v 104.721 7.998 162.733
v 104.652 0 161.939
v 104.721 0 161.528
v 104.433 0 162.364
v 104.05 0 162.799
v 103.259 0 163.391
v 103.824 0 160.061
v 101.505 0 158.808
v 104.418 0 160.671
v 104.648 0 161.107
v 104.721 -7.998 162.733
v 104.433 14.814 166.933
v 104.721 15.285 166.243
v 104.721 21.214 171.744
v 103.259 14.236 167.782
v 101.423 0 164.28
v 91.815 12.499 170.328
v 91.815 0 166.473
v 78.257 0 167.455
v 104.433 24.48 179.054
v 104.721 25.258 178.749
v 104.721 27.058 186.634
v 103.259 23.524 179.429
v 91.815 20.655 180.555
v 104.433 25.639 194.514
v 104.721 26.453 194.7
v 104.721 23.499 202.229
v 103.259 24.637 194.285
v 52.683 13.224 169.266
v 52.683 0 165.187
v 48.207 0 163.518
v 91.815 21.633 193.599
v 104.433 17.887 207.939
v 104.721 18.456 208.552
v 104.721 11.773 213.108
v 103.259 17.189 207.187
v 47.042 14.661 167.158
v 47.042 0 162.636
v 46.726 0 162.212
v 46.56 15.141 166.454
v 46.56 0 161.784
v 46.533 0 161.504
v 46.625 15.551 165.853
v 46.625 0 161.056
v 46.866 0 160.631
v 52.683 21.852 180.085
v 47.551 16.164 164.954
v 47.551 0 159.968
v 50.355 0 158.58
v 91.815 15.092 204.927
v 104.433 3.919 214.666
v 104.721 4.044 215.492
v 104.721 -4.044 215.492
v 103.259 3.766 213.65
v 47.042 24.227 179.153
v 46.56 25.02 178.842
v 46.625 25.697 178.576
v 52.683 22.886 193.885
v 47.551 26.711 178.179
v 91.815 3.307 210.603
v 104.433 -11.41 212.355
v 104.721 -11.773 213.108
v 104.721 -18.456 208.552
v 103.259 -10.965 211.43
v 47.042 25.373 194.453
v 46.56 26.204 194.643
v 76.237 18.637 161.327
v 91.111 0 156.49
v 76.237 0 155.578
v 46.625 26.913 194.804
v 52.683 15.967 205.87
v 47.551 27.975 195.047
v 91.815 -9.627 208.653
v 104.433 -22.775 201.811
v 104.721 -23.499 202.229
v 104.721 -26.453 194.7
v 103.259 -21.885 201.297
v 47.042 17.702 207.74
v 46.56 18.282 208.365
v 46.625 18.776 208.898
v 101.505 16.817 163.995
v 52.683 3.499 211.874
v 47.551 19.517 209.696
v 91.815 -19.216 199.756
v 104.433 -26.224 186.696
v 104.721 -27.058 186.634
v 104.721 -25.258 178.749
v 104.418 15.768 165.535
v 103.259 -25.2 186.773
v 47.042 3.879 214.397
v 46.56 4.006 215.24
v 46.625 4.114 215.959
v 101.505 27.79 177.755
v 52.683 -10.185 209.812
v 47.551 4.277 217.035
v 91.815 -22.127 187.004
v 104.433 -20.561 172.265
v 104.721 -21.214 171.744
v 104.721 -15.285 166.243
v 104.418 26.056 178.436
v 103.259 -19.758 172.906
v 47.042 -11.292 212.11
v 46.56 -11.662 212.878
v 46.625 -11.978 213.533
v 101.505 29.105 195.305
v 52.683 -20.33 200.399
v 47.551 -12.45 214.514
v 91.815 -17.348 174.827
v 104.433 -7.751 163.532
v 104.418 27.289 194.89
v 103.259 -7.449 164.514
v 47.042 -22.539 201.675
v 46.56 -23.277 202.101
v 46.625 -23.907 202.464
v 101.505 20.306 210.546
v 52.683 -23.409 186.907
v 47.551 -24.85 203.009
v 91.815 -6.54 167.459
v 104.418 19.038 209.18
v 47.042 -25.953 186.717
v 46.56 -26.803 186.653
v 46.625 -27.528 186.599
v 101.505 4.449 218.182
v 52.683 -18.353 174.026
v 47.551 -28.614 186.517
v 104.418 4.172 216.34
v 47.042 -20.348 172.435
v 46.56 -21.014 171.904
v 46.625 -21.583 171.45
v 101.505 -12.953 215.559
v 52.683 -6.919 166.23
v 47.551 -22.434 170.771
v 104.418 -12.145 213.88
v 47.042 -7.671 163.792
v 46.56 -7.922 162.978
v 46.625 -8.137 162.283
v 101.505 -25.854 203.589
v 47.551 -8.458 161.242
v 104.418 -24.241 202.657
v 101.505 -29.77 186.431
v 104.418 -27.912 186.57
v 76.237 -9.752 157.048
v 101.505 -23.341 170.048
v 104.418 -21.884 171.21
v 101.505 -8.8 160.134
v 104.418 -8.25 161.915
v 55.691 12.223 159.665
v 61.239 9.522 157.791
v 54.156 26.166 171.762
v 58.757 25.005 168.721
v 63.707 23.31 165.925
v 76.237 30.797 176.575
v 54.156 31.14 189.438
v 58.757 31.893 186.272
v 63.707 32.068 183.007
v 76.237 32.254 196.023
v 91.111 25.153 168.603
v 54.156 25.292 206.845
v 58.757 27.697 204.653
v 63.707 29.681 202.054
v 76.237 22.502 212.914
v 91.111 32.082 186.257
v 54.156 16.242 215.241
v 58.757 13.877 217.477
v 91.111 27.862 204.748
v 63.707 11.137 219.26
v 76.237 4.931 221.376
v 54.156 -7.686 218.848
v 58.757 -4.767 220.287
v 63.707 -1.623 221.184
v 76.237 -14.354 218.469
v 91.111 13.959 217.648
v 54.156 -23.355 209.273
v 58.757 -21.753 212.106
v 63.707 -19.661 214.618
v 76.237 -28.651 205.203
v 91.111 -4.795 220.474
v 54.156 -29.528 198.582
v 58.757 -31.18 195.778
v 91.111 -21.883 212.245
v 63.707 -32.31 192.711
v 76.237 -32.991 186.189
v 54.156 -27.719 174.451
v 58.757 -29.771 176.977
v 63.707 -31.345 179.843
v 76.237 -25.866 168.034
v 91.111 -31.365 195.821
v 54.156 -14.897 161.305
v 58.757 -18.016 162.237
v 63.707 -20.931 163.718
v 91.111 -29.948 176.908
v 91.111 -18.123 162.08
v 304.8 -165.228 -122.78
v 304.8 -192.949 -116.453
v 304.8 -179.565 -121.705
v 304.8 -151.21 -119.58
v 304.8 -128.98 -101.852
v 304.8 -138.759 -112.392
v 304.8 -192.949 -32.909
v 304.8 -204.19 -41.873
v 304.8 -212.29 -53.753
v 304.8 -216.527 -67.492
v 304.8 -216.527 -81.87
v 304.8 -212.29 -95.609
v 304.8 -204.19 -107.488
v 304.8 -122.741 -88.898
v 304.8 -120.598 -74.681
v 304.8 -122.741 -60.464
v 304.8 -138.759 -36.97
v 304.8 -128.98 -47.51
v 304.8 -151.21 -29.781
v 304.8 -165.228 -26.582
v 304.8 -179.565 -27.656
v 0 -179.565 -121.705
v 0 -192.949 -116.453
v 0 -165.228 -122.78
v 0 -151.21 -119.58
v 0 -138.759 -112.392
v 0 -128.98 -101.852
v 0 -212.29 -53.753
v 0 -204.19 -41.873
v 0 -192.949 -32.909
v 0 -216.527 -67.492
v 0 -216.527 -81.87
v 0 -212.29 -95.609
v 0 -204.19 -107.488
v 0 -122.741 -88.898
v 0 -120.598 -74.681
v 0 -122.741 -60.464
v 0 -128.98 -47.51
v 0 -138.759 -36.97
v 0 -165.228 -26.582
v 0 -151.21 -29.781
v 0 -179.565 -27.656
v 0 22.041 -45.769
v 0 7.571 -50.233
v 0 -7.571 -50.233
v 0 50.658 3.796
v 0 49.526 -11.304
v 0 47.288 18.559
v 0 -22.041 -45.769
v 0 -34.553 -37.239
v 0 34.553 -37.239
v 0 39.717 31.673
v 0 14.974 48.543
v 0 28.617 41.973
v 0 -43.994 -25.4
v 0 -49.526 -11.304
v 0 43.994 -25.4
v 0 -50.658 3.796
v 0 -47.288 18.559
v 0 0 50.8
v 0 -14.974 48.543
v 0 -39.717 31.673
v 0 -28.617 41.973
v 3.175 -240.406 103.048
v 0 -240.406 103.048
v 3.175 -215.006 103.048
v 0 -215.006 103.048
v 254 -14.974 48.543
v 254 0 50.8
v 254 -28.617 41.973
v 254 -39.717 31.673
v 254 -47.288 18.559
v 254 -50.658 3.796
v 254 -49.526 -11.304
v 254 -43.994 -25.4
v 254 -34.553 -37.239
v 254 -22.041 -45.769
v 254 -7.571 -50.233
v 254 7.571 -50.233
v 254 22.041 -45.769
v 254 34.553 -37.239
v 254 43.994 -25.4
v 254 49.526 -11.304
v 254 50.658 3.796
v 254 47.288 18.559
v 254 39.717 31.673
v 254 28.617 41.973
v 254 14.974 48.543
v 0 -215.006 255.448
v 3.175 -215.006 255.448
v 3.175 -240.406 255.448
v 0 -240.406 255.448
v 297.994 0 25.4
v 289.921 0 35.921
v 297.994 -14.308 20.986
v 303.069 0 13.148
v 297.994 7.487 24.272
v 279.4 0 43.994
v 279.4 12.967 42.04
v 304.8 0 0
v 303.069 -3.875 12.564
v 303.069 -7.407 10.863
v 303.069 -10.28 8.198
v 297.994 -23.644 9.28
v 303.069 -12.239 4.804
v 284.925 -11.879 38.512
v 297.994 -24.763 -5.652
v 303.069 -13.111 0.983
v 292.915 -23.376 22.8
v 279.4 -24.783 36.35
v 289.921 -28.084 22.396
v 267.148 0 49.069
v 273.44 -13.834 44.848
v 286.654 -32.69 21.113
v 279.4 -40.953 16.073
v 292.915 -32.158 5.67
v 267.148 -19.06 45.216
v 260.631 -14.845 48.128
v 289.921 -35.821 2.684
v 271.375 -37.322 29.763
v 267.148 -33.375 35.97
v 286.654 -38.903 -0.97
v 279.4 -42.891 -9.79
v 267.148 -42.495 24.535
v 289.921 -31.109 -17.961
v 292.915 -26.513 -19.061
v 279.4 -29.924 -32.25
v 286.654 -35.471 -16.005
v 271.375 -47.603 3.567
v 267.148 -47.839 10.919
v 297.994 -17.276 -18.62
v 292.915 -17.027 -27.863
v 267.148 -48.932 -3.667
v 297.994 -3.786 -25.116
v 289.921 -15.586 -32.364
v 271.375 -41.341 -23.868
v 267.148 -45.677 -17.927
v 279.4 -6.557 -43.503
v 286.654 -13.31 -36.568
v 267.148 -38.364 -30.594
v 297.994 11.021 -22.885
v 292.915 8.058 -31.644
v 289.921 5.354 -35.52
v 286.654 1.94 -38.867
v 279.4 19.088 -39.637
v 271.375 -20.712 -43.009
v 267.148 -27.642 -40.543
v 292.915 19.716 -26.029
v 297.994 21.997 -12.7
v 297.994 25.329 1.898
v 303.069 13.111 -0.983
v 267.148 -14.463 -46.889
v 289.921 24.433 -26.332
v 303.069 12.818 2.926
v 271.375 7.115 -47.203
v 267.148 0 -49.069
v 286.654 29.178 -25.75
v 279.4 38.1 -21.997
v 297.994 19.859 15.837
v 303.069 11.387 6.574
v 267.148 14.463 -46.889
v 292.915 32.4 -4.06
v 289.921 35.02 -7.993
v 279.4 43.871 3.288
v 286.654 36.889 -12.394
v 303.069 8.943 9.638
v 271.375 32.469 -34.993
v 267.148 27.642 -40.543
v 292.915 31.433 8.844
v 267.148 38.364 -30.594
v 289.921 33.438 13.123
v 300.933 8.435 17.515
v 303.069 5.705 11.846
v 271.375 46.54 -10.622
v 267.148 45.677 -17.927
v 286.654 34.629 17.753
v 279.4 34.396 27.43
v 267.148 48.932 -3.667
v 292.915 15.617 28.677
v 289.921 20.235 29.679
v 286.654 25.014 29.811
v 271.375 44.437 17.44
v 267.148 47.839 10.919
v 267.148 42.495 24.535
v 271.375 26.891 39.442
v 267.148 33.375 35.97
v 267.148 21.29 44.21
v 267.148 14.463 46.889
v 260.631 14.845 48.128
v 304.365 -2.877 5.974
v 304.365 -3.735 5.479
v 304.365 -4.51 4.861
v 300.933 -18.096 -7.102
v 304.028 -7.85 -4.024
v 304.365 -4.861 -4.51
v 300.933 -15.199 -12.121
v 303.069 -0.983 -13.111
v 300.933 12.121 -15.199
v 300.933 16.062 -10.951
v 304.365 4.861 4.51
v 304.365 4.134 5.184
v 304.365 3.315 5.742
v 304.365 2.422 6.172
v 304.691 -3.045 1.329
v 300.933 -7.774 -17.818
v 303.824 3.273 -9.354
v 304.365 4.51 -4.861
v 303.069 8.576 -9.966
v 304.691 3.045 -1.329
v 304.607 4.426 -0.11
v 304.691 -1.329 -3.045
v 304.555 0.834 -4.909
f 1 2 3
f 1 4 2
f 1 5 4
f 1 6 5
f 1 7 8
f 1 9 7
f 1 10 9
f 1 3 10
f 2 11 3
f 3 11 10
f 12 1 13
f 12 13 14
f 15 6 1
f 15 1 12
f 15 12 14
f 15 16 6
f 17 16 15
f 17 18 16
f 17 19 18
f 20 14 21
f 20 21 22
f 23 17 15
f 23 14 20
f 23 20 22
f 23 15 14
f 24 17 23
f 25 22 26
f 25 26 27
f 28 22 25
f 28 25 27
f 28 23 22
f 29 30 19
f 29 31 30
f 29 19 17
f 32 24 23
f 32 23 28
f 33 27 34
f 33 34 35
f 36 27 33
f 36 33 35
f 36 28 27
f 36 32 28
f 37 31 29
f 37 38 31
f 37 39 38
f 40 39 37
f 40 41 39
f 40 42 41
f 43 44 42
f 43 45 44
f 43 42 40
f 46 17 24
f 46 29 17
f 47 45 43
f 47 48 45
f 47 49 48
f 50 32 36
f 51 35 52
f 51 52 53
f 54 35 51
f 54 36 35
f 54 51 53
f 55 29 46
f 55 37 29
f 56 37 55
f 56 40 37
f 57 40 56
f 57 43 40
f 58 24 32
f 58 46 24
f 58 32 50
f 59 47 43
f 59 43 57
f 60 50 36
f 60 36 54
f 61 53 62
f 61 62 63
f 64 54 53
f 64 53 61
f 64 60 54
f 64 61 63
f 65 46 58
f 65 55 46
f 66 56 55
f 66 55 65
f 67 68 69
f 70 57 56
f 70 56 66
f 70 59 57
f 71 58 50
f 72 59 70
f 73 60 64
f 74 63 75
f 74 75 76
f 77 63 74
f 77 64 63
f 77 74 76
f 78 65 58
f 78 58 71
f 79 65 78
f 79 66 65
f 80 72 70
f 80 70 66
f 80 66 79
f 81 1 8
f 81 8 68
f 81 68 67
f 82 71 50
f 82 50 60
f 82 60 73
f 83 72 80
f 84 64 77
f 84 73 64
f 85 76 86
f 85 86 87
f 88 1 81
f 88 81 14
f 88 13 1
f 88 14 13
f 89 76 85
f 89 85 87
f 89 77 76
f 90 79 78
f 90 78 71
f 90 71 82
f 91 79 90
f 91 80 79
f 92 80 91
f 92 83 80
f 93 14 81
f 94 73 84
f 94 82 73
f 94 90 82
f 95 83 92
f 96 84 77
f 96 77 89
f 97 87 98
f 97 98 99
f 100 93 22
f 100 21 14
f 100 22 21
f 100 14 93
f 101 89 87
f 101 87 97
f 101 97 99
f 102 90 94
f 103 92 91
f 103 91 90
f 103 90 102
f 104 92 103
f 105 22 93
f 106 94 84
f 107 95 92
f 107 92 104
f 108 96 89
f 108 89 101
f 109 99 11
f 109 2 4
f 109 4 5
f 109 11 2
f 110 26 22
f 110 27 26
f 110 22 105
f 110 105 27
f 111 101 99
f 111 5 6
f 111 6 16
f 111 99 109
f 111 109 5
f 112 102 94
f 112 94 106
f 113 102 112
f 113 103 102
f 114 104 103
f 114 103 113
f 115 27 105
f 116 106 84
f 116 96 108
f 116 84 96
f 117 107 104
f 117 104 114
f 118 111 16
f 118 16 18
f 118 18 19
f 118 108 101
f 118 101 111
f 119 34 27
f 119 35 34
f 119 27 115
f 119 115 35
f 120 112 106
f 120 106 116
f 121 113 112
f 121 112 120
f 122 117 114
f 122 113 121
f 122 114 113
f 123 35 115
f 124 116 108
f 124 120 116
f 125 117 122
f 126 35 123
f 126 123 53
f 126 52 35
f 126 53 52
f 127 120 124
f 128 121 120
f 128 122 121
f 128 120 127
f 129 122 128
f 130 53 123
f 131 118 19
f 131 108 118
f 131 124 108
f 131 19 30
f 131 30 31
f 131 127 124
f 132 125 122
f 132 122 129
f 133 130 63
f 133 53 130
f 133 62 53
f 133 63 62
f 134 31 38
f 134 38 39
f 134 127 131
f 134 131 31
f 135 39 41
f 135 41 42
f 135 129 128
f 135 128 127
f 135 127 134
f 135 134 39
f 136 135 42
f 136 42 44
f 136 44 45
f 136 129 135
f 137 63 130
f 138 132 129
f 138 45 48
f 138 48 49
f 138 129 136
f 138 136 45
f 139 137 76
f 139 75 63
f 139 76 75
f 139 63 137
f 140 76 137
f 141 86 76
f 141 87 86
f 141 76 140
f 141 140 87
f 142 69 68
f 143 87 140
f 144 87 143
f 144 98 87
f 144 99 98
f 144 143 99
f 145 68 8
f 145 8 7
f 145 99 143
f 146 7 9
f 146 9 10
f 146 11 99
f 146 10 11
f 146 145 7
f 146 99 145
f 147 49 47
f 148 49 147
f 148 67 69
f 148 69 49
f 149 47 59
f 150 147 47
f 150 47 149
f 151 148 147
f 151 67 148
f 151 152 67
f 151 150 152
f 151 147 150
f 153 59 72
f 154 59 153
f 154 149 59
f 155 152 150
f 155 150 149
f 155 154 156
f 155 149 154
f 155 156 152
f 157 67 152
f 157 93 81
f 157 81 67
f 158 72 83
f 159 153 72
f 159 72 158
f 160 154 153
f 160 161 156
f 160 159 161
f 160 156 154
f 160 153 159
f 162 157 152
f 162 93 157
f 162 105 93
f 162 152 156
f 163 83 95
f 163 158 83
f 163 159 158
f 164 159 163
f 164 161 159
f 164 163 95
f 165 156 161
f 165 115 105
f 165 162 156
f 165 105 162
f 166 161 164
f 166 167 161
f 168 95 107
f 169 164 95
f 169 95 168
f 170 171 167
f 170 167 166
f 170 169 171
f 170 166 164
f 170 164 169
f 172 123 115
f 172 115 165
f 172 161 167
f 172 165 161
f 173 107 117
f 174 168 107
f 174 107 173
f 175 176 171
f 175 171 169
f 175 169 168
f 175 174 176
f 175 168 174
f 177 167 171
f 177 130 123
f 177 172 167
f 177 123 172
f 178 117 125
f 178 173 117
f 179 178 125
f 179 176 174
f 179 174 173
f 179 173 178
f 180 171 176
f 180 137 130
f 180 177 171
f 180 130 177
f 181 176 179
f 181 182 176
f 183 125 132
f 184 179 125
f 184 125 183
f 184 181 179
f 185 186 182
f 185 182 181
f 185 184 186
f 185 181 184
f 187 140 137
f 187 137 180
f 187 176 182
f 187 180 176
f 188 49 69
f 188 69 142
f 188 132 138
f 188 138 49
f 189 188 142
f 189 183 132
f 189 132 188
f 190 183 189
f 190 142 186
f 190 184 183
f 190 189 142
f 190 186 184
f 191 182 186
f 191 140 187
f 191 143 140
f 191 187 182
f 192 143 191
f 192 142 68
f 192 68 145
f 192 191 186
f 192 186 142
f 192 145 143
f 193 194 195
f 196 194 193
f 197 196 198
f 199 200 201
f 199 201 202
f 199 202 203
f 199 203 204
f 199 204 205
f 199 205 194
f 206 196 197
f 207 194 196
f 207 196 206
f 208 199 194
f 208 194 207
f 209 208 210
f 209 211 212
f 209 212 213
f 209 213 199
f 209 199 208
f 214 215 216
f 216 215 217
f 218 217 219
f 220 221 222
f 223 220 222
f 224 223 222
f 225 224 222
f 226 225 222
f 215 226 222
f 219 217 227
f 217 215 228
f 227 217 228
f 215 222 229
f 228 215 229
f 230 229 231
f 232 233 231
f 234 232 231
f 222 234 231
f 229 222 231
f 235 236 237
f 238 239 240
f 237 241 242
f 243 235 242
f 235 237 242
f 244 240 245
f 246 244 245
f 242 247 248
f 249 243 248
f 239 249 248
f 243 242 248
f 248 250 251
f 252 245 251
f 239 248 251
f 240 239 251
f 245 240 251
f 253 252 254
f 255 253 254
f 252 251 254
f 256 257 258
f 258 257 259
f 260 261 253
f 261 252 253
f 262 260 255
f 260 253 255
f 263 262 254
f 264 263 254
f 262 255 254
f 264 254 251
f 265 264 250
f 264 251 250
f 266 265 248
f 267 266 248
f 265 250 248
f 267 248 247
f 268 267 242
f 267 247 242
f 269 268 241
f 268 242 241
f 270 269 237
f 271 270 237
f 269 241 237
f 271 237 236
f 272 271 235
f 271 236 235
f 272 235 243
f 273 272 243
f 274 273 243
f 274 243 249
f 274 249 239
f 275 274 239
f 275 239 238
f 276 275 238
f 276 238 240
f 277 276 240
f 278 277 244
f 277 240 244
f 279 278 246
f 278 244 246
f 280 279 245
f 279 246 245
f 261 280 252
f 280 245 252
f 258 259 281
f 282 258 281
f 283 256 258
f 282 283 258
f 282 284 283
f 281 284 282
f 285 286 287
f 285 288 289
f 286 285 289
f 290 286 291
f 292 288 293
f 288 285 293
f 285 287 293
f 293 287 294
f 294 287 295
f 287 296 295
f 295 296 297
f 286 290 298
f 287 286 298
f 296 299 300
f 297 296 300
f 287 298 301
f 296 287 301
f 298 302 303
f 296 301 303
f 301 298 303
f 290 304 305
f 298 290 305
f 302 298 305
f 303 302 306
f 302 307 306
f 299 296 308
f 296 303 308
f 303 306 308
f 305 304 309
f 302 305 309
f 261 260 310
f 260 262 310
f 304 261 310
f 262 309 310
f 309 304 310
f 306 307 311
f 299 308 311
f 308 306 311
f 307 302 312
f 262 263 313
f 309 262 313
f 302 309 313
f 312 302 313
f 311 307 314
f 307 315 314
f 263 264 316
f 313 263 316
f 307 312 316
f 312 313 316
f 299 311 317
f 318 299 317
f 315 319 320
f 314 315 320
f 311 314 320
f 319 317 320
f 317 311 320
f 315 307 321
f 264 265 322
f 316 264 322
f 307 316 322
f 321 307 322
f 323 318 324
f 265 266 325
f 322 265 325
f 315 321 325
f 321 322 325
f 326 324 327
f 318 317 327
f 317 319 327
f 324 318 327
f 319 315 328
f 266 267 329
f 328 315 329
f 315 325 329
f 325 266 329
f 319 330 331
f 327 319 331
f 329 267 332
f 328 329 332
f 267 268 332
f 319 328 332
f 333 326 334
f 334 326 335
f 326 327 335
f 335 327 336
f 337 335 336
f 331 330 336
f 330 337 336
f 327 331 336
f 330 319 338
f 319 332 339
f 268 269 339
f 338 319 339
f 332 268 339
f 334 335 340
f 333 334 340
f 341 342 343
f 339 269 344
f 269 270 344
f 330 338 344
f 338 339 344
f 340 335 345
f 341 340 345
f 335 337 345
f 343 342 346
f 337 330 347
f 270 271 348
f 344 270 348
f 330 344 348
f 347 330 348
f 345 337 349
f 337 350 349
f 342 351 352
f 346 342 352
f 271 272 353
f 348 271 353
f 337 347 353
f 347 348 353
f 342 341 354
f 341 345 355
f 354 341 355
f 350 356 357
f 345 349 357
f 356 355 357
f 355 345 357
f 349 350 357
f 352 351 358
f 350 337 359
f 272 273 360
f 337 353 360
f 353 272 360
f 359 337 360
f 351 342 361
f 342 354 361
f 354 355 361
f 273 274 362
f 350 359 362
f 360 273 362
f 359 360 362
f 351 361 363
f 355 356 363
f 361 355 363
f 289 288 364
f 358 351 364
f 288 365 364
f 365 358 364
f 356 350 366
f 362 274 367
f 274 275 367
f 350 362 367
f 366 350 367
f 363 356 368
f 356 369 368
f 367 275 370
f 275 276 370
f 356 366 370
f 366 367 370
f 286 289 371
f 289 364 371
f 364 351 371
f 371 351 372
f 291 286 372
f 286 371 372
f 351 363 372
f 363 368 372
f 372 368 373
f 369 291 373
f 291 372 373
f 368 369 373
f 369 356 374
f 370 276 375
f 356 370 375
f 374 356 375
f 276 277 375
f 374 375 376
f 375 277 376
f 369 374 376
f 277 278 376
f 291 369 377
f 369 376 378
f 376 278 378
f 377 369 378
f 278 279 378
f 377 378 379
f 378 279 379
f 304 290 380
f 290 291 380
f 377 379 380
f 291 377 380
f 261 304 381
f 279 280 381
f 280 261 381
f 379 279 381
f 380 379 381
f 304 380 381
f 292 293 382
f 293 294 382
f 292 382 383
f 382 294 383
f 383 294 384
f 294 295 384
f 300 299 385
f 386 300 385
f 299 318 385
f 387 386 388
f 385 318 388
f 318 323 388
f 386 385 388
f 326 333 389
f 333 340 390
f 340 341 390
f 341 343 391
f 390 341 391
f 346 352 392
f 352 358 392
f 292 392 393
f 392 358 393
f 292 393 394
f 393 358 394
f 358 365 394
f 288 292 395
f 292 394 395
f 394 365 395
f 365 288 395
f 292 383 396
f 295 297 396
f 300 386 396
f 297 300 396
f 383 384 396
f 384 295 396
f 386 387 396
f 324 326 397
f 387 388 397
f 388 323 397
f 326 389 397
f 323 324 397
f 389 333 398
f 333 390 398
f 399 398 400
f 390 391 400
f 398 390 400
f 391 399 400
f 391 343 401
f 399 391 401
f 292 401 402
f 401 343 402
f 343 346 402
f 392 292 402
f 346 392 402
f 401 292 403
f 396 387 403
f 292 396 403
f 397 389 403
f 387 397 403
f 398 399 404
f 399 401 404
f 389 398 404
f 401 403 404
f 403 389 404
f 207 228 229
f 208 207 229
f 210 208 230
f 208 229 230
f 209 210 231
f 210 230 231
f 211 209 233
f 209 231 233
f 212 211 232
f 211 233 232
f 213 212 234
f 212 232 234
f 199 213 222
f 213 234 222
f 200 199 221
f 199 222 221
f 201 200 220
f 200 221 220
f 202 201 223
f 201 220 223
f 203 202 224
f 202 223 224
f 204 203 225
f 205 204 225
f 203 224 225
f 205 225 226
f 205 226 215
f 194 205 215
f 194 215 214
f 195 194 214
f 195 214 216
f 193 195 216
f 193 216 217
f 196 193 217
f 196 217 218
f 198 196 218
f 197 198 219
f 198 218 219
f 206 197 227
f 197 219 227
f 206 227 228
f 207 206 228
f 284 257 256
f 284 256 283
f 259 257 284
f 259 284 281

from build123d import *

# Parameters (mm, degrees)
F4_R     = 48.233949
F5_DEPTH = 304.8
F6_W     = 25.4
F6_H     = 152.4
F7_DEPTH = 3.175


with BuildPart() as f1:
    # F0 (on Front) → F1 (revolve)
    with BuildSketch(Plane.XZ):
        with BuildLine():
            Line((254, 50.8), (0, 50.8))
            Line((0, 50.8), (0, 0))
            Line((0, 0), (304.800008, 0))
            ThreePointArc((304.800008, 0), (289.921027, 35.921025), (254, 50.8))
        make_face()
    revolve(axis=Axis((152.400004, 0, 0), (1, 0, 0)))


with BuildPart() as f3:
    # F2 (on Front) → F3 (revolve)
    with BuildSketch(Plane.XZ):
        with BuildLine():
            add(Edge.make_bspline(
                [(104.721367, 161.527976), (104.721367, 171.835518), (61.080206, 166.681747), (17.439045, 161.527976), (61.080206, 156.374206), (104.721367, 151.220435), (104.721367, 161.527976)],
                knots=[0, 0, 0, 2.094395, 2.094395, 4.18879, 4.18879, 6.283185, 6.283185, 6.283185], degree=2, weights=[1, 0.5, 1, 0.5, 1, 0.5, 1]))
        make_face()
    revolve(axis=Axis((76.313546, 0, 188.661709), (1, 0, 0)))


with BuildPart() as f5:
    # F4 (on Right) → F5 (new body)
    with BuildSketch(Plane.YZ):
        with Locations((-168.832272, -74.680761)):
            Circle(F4_R)
    extrude(amount=F5_DEPTH)


with BuildPart() as f7:
    # F6 (on Right) → F7 (new body)
    with BuildSketch(Plane.YZ):
        with Locations((-227.706275, 179.247691)):
            Rectangle(F6_W, F6_H)
    extrude(amount=F7_DEPTH)


solid = Compound([f1.part, f3.part, f5.part, f7.part])
